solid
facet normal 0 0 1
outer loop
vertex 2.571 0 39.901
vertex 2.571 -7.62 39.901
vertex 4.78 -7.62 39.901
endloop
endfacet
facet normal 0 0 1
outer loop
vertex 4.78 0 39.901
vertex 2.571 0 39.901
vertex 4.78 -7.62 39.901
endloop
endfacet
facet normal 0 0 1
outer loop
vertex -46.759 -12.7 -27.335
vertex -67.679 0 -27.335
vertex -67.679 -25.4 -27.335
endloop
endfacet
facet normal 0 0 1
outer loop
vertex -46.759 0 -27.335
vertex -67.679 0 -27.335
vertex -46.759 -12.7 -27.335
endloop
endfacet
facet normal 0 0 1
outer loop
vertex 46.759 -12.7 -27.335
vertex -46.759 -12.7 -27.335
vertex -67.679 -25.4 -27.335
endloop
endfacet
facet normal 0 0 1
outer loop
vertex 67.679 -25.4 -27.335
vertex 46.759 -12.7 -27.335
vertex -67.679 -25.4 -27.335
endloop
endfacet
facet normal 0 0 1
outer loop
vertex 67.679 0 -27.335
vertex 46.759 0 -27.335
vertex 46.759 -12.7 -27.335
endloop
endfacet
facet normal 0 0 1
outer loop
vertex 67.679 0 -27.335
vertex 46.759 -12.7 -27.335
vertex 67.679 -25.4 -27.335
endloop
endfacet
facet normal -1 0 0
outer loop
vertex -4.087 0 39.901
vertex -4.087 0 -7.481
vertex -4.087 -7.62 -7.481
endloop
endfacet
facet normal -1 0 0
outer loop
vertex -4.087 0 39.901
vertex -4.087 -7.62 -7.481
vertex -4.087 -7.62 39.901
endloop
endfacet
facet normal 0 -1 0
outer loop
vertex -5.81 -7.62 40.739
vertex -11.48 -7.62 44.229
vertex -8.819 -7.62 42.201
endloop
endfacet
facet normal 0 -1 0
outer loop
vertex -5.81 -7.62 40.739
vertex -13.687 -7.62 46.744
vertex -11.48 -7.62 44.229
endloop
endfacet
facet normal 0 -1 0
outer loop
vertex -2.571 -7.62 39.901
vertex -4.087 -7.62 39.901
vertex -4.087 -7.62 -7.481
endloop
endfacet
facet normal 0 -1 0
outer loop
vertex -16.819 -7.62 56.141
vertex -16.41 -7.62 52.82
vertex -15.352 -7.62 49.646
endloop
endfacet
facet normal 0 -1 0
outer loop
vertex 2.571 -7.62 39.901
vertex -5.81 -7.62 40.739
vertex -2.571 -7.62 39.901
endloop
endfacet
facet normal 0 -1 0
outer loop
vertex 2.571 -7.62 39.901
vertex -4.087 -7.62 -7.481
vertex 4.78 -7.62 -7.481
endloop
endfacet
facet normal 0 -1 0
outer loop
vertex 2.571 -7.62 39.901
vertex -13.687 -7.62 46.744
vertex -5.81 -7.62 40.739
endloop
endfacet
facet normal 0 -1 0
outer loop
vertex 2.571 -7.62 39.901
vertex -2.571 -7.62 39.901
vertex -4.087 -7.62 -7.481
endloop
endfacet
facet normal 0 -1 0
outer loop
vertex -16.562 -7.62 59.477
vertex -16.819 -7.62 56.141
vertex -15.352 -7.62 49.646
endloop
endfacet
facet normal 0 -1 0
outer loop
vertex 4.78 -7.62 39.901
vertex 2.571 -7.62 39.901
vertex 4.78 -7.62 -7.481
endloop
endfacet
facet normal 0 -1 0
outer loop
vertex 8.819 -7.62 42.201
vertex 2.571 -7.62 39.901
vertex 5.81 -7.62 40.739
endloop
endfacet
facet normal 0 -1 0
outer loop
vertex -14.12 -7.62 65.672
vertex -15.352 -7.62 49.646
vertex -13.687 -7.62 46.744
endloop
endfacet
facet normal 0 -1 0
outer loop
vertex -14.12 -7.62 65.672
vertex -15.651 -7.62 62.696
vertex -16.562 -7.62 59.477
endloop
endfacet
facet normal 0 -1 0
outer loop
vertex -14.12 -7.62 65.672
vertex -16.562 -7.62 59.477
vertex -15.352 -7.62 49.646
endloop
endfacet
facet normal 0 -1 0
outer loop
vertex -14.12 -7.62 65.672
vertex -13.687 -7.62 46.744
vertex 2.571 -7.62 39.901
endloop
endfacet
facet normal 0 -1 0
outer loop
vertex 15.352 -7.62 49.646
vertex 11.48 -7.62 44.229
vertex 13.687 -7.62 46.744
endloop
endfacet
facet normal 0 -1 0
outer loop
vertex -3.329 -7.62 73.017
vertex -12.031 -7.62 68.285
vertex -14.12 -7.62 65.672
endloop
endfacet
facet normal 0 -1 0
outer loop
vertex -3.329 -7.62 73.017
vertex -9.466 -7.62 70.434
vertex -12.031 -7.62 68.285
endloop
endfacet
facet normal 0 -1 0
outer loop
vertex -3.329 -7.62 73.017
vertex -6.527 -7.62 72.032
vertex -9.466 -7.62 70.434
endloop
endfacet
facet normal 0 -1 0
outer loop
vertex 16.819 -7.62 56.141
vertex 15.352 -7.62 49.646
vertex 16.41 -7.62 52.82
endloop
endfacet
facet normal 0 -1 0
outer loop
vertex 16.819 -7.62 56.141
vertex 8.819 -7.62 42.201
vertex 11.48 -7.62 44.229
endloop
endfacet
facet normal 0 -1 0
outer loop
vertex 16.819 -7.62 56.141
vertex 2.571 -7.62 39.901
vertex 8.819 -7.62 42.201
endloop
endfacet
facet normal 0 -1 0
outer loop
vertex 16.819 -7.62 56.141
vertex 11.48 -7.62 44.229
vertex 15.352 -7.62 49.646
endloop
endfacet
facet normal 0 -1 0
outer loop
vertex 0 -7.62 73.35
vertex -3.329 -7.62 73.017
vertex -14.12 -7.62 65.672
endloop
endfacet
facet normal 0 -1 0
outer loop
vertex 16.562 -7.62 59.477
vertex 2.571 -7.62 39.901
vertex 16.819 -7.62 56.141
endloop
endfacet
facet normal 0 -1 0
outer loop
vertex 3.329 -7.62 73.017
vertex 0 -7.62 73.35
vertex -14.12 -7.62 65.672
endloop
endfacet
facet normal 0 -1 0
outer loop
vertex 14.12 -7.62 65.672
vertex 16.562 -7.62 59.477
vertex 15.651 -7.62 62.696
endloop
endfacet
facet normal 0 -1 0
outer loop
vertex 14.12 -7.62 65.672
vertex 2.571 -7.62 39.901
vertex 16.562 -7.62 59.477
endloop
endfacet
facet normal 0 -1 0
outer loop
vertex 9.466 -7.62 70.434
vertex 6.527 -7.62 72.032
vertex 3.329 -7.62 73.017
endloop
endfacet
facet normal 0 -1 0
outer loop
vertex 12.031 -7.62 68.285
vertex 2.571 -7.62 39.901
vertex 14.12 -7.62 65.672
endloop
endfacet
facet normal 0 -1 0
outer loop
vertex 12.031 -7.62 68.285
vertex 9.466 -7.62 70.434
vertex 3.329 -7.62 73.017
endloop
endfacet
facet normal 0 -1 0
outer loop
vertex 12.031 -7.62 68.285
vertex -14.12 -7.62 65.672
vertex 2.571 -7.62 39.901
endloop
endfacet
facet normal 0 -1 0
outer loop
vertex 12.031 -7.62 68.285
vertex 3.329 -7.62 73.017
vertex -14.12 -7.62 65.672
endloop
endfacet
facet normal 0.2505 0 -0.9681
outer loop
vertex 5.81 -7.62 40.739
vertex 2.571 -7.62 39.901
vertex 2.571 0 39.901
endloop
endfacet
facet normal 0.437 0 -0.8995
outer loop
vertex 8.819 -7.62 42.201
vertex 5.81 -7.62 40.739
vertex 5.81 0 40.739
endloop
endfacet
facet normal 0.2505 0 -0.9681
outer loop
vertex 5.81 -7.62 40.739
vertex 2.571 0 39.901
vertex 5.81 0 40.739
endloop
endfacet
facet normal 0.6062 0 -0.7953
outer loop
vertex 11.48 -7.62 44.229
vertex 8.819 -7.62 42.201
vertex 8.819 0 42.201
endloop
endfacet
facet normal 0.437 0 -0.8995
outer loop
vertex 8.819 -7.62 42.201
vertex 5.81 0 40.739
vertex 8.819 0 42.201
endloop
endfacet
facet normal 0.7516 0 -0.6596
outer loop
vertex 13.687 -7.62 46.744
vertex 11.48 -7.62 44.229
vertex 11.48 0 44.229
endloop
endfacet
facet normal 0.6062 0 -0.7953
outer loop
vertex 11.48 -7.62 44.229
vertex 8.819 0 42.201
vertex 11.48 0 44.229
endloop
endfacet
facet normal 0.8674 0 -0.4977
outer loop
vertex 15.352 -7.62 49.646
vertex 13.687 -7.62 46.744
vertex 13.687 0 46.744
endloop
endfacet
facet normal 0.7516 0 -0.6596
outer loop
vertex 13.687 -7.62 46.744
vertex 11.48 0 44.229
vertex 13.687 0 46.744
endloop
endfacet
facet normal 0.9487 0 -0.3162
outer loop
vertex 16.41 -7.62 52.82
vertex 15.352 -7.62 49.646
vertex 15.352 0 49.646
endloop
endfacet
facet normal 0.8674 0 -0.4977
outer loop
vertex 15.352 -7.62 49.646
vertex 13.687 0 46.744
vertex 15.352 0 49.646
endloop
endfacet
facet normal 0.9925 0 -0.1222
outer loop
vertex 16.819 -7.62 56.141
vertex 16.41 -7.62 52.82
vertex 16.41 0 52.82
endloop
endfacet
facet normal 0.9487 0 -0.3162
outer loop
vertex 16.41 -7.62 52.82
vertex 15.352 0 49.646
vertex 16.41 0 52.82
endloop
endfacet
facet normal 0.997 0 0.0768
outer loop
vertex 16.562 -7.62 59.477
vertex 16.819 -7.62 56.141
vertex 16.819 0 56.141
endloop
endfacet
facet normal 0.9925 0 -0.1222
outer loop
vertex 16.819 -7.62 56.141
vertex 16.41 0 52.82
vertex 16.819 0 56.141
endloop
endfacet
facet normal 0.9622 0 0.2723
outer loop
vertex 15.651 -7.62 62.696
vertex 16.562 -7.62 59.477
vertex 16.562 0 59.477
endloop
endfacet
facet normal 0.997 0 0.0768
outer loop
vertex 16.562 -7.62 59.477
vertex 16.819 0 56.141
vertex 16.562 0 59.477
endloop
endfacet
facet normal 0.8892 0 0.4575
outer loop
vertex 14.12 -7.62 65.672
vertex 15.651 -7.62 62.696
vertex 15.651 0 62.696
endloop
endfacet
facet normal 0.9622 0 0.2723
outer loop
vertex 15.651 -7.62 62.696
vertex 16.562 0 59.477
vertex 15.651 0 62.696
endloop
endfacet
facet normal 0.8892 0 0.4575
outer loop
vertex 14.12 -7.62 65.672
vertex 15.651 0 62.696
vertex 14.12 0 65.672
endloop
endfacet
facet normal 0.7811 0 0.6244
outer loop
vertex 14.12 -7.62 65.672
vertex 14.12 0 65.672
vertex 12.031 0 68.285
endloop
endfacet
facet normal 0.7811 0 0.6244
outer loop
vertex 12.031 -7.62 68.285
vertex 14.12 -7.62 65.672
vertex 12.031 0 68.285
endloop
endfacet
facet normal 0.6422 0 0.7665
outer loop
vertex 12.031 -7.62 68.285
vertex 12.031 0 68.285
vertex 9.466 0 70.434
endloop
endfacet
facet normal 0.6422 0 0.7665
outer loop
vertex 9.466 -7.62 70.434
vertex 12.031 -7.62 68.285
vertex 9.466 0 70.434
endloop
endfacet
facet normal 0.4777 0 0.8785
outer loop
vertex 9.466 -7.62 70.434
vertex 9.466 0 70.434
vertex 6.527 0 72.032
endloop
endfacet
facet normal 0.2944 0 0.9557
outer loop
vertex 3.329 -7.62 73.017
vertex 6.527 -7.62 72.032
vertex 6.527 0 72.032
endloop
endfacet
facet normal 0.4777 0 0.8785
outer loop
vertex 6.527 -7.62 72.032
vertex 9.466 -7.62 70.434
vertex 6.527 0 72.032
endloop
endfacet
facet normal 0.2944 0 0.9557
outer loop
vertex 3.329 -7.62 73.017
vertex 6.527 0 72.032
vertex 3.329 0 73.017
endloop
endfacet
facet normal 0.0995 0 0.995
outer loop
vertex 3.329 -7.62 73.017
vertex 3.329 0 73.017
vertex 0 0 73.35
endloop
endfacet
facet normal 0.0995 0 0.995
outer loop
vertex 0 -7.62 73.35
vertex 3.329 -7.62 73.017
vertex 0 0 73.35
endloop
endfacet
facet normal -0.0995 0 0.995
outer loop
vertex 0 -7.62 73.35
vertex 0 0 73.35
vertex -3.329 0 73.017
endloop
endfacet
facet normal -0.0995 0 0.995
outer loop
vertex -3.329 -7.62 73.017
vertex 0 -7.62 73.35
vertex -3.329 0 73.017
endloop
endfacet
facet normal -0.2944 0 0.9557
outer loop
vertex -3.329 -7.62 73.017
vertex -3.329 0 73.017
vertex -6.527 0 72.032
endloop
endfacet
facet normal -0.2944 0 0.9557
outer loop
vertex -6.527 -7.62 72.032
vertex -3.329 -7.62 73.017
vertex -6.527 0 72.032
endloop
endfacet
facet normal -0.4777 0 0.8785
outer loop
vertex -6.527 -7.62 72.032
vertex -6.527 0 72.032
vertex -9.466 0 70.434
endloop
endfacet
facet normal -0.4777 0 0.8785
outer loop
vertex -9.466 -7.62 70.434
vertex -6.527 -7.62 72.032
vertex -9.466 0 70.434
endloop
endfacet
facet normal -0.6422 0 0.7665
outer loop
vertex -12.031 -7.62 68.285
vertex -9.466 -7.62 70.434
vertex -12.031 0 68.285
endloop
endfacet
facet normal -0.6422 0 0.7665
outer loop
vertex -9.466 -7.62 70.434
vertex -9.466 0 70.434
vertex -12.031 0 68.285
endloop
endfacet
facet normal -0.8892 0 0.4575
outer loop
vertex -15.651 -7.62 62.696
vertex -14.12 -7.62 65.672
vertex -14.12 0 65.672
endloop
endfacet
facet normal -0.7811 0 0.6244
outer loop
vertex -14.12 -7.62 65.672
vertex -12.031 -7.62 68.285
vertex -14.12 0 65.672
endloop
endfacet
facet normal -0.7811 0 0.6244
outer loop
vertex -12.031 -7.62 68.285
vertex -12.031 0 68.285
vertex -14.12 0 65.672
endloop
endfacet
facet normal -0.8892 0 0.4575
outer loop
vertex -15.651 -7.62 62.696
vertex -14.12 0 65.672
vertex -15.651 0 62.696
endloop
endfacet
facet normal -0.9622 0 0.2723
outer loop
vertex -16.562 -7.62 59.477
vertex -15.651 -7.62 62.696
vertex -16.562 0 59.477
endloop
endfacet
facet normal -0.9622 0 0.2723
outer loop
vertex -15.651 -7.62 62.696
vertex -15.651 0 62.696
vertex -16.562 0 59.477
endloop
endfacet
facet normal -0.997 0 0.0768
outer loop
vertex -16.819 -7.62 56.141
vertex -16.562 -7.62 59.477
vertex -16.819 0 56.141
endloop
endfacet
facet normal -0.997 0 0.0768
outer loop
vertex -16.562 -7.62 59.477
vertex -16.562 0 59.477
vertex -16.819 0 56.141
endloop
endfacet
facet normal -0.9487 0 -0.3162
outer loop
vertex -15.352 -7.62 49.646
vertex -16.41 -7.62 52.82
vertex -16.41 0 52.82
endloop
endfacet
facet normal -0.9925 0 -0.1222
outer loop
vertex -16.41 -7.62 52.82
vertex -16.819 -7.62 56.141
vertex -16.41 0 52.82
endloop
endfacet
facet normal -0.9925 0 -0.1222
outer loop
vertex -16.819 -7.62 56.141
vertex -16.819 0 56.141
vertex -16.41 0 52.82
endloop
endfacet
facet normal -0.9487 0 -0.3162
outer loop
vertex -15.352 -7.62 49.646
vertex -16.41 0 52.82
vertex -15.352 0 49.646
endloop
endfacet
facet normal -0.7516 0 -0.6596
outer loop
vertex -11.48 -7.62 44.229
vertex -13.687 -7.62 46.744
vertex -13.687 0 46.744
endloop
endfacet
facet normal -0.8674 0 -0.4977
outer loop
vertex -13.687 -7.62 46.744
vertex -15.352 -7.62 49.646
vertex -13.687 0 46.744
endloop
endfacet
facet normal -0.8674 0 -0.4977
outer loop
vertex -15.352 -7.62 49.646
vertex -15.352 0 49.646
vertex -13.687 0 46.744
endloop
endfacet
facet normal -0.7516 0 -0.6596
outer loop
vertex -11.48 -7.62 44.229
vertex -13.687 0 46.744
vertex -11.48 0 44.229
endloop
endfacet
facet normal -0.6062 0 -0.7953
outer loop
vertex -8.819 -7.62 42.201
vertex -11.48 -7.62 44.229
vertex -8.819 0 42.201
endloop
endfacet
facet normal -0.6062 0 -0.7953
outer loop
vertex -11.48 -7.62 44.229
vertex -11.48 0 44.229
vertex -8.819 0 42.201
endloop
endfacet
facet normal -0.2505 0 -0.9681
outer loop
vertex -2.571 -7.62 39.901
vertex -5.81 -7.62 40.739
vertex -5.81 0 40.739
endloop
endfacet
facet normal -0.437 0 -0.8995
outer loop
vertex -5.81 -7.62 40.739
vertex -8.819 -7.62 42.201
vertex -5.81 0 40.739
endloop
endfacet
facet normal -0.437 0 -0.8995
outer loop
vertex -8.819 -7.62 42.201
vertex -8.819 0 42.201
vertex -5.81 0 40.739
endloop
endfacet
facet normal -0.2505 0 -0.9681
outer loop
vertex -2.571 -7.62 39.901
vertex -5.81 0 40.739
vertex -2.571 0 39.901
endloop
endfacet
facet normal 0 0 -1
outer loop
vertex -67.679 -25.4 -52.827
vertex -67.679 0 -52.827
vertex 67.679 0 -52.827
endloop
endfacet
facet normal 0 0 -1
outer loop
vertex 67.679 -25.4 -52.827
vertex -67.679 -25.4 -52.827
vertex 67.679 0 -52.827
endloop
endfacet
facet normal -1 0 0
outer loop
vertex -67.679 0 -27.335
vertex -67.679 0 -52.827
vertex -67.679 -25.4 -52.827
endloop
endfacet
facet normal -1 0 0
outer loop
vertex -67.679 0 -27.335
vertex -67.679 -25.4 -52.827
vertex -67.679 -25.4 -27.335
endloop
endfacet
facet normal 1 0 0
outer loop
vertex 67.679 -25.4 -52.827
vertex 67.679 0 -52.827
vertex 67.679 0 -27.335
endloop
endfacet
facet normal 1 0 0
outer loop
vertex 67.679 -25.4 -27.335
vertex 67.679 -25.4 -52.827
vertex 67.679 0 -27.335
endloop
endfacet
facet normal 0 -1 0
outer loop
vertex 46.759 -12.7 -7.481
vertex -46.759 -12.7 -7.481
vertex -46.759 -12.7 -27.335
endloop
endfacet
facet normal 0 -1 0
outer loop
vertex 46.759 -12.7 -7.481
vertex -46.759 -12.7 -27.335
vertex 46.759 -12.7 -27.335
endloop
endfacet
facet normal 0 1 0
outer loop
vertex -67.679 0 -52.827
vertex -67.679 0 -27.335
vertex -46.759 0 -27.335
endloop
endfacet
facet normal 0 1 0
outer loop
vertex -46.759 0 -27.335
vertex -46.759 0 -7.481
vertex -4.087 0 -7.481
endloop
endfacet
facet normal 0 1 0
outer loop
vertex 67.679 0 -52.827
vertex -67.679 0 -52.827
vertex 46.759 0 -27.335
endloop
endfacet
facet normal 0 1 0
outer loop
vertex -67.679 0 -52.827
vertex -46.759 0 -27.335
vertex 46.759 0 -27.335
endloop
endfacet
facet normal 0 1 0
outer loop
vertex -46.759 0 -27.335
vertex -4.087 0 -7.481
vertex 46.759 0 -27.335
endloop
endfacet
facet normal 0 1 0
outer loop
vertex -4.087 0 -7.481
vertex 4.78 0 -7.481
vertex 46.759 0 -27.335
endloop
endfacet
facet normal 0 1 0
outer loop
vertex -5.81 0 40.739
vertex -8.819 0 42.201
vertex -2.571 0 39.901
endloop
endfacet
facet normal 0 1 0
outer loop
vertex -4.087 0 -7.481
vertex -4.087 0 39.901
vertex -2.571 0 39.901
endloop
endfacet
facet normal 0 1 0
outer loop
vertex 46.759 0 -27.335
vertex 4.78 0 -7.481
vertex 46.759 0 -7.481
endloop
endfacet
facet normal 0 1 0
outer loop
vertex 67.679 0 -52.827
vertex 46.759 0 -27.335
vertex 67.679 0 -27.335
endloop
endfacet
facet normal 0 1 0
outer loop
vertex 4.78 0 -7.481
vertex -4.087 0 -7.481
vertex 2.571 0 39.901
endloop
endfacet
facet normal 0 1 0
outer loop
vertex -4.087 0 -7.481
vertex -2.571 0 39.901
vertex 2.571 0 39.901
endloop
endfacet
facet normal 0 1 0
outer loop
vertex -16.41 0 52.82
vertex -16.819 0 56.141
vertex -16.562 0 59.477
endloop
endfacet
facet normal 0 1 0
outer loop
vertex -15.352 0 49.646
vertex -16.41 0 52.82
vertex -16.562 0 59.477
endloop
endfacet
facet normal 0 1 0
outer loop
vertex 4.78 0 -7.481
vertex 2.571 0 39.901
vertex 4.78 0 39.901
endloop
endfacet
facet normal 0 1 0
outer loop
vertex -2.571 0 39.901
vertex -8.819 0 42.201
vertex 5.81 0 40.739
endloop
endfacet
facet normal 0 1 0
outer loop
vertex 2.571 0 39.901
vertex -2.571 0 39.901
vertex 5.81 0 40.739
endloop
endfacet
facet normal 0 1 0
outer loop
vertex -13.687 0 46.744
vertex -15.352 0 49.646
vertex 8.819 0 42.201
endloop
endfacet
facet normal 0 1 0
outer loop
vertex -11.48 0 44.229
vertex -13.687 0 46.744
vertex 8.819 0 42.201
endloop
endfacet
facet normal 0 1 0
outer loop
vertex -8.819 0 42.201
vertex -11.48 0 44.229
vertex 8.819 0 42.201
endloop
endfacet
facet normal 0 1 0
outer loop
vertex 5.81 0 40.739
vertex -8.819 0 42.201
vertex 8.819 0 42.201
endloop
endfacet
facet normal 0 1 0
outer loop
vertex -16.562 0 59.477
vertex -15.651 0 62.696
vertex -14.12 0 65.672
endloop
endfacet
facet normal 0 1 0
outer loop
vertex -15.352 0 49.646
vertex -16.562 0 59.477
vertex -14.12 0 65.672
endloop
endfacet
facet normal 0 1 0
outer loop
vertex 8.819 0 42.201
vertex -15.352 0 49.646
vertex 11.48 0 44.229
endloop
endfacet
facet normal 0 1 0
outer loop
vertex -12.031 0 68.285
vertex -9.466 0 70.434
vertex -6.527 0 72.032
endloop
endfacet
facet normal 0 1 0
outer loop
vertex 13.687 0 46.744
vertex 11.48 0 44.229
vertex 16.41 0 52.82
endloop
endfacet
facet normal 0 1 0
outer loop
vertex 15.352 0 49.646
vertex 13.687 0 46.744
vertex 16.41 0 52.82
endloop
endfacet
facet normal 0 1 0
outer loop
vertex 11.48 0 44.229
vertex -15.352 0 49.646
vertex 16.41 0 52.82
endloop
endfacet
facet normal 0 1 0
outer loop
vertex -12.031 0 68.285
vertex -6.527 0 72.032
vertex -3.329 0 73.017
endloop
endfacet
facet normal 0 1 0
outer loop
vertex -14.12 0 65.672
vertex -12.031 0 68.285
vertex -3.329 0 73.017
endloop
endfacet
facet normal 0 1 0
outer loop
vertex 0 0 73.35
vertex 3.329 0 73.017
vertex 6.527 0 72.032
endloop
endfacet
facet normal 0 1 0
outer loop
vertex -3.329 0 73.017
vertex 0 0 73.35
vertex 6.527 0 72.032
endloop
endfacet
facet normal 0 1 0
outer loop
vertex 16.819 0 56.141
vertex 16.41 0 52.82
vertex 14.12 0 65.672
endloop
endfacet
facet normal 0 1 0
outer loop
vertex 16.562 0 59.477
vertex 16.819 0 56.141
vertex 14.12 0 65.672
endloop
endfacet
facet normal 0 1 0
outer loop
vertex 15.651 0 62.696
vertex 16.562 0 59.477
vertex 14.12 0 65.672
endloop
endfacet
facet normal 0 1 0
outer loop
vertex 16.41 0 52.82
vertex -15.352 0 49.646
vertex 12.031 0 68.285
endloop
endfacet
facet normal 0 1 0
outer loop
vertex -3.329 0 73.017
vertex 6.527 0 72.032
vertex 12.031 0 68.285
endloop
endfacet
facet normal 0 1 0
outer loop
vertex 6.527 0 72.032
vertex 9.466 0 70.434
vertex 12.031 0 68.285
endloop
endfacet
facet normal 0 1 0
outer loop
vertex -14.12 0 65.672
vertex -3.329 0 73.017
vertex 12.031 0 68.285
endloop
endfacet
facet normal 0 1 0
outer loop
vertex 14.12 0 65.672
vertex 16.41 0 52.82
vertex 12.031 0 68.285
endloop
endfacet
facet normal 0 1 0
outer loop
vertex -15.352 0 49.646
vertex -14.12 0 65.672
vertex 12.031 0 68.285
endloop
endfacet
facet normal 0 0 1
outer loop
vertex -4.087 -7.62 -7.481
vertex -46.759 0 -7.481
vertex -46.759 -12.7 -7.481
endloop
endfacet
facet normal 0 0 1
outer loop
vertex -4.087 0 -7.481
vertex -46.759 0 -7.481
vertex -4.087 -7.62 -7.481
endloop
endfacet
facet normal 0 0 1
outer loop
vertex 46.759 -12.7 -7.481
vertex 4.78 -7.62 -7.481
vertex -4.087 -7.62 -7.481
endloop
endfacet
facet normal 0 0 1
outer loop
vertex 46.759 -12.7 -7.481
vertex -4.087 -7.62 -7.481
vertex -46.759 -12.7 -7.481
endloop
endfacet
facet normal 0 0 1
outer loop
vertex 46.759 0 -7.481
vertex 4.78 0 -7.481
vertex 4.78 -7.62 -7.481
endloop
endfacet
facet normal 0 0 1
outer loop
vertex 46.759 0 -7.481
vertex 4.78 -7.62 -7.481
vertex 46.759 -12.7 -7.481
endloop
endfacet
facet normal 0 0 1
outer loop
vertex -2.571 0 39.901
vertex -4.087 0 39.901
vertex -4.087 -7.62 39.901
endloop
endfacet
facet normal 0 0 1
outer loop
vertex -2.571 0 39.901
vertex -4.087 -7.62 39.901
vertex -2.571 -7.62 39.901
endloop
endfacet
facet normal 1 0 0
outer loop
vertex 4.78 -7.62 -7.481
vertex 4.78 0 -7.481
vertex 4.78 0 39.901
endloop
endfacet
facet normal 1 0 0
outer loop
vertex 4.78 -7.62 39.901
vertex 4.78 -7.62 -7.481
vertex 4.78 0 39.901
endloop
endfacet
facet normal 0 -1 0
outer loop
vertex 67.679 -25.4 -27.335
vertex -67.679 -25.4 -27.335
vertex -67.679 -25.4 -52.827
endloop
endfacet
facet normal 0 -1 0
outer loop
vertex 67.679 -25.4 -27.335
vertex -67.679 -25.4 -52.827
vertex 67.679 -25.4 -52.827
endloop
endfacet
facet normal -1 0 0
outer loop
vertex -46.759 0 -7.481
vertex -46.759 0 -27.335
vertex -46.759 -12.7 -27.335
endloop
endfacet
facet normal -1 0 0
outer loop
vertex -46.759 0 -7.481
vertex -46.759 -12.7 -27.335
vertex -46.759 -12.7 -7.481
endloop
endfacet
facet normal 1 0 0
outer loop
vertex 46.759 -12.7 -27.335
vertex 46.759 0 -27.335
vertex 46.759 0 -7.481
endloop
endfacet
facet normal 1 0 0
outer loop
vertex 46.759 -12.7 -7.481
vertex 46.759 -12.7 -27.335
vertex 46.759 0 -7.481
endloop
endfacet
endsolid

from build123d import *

# Parameters (mm, degrees)
F0_W     = 135.3589
F0_H     = 25.492367
F1_DEPTH = 25.4
F2_W     = 93.518182
F2_H     = 19.950546
F3_DEPTH = 12.7
F4_W     = 8.866911
F4_H     = 47.382544
F5_DEPTH = 7.62
F6_R     = 16.823006
F7_DEPTH = 7.62


with BuildPart() as f1:
    # F0 (on Front) → F1 (new body)
    with BuildSketch(Plane.XZ):
        with Locations((0, -40.080897)):
            Rectangle(F0_W, F0_H)
    extrude(amount=F1_DEPTH)

    # F2 (on Front) → F3 (join)
    with BuildSketch(Plane.XZ):
        with Locations((0, -17.456727)):
            Rectangle(F2_W, F2_H)
    extrude(amount=F3_DEPTH)

    # F4 (on Front) → F5 (join)
    with BuildSketch(Plane.XZ):
        with Locations((0.346363, 16.209817)):
            Rectangle(F4_W, F4_H)
    extrude(amount=F5_DEPTH)

    # F6 (on Front) → F7 (join)
    with BuildSketch(Plane.XZ):
        with Locations((0, 56.526545)):
            Circle(F6_R)
    extrude(amount=F7_DEPTH)


solid = f1.part
